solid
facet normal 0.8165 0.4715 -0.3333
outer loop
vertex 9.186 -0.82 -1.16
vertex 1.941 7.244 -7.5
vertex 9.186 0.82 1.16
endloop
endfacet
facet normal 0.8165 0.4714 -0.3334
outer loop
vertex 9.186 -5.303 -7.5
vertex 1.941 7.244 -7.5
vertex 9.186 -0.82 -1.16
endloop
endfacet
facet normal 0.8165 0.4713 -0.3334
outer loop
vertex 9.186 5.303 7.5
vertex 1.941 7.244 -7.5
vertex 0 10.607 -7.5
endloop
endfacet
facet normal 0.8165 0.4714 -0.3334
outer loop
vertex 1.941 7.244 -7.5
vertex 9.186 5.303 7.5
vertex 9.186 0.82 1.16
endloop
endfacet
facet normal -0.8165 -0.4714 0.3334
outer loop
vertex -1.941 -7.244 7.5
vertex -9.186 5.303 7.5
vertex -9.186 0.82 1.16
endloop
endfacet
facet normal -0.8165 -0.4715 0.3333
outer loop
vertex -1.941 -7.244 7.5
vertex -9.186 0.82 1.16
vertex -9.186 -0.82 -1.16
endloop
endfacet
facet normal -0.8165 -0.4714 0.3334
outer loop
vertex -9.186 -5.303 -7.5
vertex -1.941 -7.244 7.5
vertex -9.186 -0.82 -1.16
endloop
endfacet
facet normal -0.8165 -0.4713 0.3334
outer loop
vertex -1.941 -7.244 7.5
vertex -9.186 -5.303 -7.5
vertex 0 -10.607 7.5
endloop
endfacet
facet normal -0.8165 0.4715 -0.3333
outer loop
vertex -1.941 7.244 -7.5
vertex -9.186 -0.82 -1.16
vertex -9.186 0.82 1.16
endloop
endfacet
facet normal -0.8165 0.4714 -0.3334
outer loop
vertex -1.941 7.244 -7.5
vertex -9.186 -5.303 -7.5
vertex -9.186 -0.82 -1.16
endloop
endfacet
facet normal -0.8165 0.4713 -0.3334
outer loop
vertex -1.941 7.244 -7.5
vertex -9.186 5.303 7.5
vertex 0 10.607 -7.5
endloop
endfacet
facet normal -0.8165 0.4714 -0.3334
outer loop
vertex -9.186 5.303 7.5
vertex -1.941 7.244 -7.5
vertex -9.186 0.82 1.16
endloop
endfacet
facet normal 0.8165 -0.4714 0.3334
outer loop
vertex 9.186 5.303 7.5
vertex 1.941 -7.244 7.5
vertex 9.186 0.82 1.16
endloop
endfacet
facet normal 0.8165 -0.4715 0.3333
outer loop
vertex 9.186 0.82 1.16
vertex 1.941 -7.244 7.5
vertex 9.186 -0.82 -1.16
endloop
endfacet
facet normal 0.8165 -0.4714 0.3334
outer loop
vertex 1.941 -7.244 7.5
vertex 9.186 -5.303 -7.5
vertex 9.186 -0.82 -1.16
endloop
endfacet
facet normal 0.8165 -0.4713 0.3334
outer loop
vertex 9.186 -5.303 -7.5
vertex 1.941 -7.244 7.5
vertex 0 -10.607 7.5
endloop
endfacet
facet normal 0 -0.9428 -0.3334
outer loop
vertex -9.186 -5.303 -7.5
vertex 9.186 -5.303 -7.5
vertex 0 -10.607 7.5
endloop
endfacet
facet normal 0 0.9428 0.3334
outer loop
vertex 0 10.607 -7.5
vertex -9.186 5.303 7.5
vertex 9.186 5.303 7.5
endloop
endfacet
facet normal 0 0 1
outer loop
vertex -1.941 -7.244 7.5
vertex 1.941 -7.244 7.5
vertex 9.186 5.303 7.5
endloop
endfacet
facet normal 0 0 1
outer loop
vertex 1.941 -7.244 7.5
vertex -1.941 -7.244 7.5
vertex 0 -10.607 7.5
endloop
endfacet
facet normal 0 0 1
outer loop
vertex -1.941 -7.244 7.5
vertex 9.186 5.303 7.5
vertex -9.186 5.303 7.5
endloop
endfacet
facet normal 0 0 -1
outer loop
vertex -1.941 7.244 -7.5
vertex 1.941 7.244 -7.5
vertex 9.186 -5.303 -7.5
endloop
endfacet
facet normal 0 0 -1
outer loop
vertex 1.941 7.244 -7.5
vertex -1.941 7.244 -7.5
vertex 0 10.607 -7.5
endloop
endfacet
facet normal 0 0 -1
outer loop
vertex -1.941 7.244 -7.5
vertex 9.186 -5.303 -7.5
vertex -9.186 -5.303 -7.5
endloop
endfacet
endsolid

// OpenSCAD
module box(size) {
    cube([2*size, 2*size, size], center = true); 
}

module octahedron(size) {
      dihedral = 109.47122;
      n = 3;
      intersection(){
            box(size);
            intersection_for(i=[1:n])  { 
                rotate([dihedral, 0, 360 /n * i])  box(size); 
           }
      }
}

scale(0.75) octahedron(20);
